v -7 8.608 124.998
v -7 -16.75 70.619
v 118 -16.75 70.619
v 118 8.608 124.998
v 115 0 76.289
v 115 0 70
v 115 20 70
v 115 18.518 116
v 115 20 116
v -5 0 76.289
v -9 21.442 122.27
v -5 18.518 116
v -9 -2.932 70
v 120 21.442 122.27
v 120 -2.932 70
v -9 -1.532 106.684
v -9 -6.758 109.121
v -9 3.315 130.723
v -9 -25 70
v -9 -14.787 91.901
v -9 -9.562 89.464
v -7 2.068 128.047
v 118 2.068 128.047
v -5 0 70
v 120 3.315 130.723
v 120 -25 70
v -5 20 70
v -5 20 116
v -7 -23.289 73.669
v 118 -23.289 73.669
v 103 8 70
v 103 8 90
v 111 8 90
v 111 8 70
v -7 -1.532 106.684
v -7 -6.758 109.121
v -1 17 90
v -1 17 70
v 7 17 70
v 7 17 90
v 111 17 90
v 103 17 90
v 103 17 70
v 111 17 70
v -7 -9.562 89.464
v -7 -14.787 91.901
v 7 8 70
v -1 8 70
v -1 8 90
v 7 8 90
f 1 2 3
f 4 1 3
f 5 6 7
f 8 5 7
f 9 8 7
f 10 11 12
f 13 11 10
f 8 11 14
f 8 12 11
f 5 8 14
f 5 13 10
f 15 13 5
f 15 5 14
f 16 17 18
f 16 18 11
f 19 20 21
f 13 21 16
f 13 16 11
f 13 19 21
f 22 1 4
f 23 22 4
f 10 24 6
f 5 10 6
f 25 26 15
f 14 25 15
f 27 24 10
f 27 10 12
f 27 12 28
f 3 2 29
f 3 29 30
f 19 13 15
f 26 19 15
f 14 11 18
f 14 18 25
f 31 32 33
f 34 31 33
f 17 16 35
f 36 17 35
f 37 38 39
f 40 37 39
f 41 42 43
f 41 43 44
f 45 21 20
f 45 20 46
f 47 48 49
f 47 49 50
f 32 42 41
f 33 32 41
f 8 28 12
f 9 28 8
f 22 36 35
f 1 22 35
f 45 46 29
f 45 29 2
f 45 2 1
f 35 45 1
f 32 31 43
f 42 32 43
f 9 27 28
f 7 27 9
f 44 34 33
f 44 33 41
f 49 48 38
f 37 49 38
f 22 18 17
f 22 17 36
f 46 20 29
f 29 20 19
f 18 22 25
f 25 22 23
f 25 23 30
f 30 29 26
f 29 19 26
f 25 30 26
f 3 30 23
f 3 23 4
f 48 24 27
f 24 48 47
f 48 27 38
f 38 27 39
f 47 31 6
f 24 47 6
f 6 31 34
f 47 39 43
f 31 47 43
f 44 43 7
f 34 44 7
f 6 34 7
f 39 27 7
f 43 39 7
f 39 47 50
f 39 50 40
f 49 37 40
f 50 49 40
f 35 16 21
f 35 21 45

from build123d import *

# Parameters (mm, degrees)
BOX009_W               = 2
BOX009_H               = 6
BOX009_DEPTH           = 19
BOX009_PLACEMENT_ANGLE = 25
BOX005_W               = 8
BOX005_H               = 9
BOX005_DEPTH           = 20
BOX007_W               = 125
BOX007_H               = 8
BOX007_DEPTH           = 60
BOX007_PLACEMENT_ANGLE = 25
BOX008_W               = 129
BOX008_H               = 47
BOX008_DEPTH           = 10
BOX004_W               = 8
BOX004_H               = 9
BOX004_DEPTH           = 20
BOX006_W               = 120
BOX006_H               = 20
BOX006_DEPTH           = 46
BOX003_W               = 129
BOX003_H               = 20
BOX003_DEPTH           = 67
BOX003_PLACEMENT_ANGLE = 25


with BuildPart() as cube009:
    # Box009 → Box009 (new body)
    with BuildSketch(Plane.XY):
        with Locations((1, 3)):
            Rectangle(BOX009_W, BOX009_H)
    extrude(amount=BOX009_DEPTH)


with BuildPart() as cube009_1:
    # Box009 placement: moved
    add(cube009.part.moved(Location((-9, -15, 92))).rotate(Axis((-9, -15, 92), (-1, 0, 0)), BOX009_PLACEMENT_ANGLE))


with BuildPart() as cube005:
    # Box005 → Box005 (new body)
    with BuildSketch(Plane(origin=(103, 8, 70), x_dir=(1, 0, 0), z_dir=(0, 0, 1))):
        with Locations((4, 4.5)):
            Rectangle(BOX005_W, BOX005_H)
    extrude(amount=BOX005_DEPTH)


with BuildPart() as cube007:
    # Box007 → Box007 (new body)
    with BuildSketch(Plane.XY):
        with Locations((62.5, 4)):
            Rectangle(BOX007_W, BOX007_H)
    extrude(amount=BOX007_DEPTH)


with BuildPart() as cube007_1:
    # Box007 placement: moved
    add(cube007.part.moved(Location((-7, -24, 74))).rotate(Axis((-7, -24, 74), (-1, 0, 0)), BOX007_PLACEMENT_ANGLE))


with BuildPart() as cube008:
    # Box008 → Box008 (new body)
    with BuildSketch(Plane(origin=(-9, -27, 60), x_dir=(1, 0, 0), z_dir=(0, 0, 1))):
        with Locations((64.5, 23.5)):
            Rectangle(BOX008_W, BOX008_H)
    extrude(amount=BOX008_DEPTH)


with BuildPart() as fusion004:
    # Box004 → Box004 (new body)
    with BuildSketch(Plane(origin=(-1, 8, 70), x_dir=(1, 0, 0), z_dir=(0, 0, 1))):
        with Locations((4, 4.5)):
            Rectangle(BOX004_W, BOX004_H)
    extrude(amount=BOX004_DEPTH)

    # Fusion004: union Cube005, Cube007, Cube008
    add(cube005.part)
    add(cube007_1.part)
    add(cube008.part)


with BuildPart() as cube006:
    # Box006 → Box006 (new body)
    with BuildSketch(Plane(origin=(-5, 0, 70), x_dir=(1, 0, 0), z_dir=(0, 0, 1))):
        with Locations((60, 10)):
            Rectangle(BOX006_W, BOX006_H)
    extrude(amount=BOX006_DEPTH)


with BuildPart() as iphonehalterung:
    # Box003 → Box003 (new body)
    with BuildSketch(Plane.XY):
        with Locations((64.5, 10)):
            Rectangle(BOX003_W, BOX003_H)
    extrude(amount=BOX003_DEPTH)


with BuildPart() as iphonehalterung_1:
    # Box003 placement: moved
    add(iphonehalterung.part.moved(Location((-9, -25, 70))).rotate(Axis((-9, -25, 70), (-1, 0, 0)), BOX003_PLACEMENT_ANGLE))

    # Fusion003: union Cube006
    add(cube006.part)

    # Cut001: cut Fusion004
    add(fusion004.part, mode=Mode.SUBTRACT)

    # Cut002: cut Cube009
    add(cube009_1.part, mode=Mode.SUBTRACT)


solid = iphonehalterung_1.part
